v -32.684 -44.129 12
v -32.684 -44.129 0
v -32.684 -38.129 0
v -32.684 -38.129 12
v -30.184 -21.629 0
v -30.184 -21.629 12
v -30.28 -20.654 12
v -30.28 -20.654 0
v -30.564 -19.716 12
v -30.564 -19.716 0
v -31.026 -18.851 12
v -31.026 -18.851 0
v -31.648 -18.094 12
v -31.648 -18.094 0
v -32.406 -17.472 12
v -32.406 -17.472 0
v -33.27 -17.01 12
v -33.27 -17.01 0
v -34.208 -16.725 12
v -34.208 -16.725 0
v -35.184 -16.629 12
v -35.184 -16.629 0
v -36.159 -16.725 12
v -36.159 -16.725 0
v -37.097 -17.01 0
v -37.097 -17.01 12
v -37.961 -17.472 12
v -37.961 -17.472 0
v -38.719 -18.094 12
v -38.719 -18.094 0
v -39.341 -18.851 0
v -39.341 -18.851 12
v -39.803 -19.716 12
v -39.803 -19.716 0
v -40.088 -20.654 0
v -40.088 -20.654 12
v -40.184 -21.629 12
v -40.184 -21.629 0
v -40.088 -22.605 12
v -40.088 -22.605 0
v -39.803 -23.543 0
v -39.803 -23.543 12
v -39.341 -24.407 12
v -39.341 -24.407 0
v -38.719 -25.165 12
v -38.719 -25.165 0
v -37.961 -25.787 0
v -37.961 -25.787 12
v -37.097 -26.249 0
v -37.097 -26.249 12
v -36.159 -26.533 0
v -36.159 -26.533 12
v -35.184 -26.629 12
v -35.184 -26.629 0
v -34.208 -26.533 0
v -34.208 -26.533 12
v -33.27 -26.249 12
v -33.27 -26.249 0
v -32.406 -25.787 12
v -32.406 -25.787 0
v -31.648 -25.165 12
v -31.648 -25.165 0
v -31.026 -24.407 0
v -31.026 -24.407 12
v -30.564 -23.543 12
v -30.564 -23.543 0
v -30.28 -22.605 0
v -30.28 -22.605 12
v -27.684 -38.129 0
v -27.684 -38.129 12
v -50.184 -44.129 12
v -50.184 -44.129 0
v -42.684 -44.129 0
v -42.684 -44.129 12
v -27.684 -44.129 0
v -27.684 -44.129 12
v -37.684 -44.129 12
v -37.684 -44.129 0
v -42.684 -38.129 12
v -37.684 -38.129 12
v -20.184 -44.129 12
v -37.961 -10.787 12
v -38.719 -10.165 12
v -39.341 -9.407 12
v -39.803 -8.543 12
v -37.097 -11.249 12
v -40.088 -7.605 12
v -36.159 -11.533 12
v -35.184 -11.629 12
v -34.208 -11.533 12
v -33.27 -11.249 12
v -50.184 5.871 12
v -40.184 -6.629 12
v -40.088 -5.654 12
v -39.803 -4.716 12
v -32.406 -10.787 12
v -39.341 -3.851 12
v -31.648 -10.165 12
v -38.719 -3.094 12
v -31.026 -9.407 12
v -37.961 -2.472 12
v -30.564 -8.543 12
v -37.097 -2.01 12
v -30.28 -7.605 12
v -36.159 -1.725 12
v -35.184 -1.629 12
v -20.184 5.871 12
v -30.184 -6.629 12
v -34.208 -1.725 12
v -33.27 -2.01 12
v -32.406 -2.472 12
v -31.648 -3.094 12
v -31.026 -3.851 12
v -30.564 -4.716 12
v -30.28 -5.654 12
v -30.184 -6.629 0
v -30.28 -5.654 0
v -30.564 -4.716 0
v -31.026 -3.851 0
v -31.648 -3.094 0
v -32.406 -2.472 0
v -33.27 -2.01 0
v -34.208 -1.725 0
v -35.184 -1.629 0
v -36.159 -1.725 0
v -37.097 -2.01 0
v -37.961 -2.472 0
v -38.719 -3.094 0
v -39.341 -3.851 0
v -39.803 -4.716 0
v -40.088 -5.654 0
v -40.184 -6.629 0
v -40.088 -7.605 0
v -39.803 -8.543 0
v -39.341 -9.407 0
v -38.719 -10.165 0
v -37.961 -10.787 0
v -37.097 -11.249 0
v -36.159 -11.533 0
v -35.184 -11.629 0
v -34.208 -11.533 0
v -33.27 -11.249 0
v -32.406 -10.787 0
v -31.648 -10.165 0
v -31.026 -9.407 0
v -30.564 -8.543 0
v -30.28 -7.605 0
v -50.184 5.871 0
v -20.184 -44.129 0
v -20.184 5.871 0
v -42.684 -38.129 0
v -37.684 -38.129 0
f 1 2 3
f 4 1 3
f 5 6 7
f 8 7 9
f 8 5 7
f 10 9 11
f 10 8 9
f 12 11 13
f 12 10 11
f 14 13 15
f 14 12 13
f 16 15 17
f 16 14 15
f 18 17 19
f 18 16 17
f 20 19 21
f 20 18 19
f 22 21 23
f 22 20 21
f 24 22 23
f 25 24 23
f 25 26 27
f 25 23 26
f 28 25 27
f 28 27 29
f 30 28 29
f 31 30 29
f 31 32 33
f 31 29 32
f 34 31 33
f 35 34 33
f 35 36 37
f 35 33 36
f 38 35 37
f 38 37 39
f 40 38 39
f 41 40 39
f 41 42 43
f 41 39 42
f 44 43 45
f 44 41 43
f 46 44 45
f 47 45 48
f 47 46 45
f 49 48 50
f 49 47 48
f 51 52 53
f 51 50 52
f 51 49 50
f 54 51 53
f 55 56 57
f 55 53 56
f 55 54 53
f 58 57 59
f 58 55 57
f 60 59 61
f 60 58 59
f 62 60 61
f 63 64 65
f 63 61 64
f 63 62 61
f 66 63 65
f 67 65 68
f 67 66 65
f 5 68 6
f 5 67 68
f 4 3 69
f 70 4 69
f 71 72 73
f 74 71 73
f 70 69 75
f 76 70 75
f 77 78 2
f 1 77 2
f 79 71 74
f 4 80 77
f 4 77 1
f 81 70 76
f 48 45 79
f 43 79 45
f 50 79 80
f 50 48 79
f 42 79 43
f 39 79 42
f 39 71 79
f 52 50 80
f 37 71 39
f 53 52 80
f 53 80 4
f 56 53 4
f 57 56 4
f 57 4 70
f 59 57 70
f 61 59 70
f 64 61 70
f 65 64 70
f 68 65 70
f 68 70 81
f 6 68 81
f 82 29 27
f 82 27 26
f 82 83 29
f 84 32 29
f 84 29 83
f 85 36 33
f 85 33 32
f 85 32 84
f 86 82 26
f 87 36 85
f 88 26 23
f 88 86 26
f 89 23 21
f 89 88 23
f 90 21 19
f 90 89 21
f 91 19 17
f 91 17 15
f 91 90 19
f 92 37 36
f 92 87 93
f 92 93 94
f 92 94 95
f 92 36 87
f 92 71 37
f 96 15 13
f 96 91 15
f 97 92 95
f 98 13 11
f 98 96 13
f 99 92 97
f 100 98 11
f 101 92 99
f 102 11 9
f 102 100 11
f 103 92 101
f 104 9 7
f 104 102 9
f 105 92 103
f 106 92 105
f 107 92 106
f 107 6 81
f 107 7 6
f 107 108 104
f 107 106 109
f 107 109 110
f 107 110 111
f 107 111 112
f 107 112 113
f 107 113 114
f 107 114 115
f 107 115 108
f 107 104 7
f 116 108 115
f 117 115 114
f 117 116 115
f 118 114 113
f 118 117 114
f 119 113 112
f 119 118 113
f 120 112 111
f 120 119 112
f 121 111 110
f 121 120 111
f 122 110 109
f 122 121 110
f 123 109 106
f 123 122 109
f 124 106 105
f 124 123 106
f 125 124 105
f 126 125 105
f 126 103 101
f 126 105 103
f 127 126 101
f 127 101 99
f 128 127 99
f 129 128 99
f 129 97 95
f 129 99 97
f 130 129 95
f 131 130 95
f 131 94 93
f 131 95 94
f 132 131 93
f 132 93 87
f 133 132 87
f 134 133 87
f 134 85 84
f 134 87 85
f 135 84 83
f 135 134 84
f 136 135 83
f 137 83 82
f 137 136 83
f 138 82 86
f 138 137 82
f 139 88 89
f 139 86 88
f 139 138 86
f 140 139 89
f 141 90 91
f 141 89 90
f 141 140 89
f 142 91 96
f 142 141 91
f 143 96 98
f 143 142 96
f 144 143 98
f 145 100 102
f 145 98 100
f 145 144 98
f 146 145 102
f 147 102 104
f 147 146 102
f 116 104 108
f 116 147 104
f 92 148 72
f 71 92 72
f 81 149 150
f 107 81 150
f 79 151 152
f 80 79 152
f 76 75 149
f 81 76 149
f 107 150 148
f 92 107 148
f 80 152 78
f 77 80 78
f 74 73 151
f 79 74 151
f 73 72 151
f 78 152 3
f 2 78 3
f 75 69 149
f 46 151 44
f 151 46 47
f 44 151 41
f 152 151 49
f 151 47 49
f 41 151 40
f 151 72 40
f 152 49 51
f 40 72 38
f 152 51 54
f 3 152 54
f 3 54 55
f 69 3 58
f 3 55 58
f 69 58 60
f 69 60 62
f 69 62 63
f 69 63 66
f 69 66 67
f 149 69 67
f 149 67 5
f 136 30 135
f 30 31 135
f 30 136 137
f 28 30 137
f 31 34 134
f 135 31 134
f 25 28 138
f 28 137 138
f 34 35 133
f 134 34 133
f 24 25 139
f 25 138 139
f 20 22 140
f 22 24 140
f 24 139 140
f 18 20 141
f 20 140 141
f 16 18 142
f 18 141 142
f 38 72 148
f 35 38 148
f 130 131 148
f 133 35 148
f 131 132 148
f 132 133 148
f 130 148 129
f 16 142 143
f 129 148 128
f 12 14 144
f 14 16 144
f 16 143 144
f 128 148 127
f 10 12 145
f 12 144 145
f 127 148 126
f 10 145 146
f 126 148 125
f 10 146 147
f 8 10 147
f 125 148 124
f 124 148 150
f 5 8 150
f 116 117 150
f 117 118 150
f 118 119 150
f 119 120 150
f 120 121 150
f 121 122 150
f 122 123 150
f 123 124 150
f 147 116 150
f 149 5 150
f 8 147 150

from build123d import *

# Parameters (mm, degrees)
F1_DEPTH = 12
F2_R     = 5
F3_DEPTH = 77.7


with BuildPart() as f1:
    # F0 (on Top) → F1 (new body)
    with BuildSketch(Plane.XY):
        Polygon((-20.183631, 5.870848), (-50.183631, 5.870848), (-50.183631, -44.129152), (-42.683631, -44.129152), (-42.683631, -38.129152), (-37.683631, -38.129152), (-37.683631, -44.129152), (-32.683631, -44.129152), (-32.683631, -38.129152), (-27.683631, -38.129152), (-27.683631, -44.129152), (-20.183631, -44.129152), align=None)
    extrude(amount=F1_DEPTH)

    # F2 (on Top) → F3 (cut)
    with BuildSketch(Plane.XY):
        with Locations((-35.183631, -6.629152)):
            Circle(F2_R)
        with Locations((-35.183631, -21.629152)):
            Circle(F2_R)
    extrude(amount=F3_DEPTH, mode=Mode.SUBTRACT)


solid = f1.part
